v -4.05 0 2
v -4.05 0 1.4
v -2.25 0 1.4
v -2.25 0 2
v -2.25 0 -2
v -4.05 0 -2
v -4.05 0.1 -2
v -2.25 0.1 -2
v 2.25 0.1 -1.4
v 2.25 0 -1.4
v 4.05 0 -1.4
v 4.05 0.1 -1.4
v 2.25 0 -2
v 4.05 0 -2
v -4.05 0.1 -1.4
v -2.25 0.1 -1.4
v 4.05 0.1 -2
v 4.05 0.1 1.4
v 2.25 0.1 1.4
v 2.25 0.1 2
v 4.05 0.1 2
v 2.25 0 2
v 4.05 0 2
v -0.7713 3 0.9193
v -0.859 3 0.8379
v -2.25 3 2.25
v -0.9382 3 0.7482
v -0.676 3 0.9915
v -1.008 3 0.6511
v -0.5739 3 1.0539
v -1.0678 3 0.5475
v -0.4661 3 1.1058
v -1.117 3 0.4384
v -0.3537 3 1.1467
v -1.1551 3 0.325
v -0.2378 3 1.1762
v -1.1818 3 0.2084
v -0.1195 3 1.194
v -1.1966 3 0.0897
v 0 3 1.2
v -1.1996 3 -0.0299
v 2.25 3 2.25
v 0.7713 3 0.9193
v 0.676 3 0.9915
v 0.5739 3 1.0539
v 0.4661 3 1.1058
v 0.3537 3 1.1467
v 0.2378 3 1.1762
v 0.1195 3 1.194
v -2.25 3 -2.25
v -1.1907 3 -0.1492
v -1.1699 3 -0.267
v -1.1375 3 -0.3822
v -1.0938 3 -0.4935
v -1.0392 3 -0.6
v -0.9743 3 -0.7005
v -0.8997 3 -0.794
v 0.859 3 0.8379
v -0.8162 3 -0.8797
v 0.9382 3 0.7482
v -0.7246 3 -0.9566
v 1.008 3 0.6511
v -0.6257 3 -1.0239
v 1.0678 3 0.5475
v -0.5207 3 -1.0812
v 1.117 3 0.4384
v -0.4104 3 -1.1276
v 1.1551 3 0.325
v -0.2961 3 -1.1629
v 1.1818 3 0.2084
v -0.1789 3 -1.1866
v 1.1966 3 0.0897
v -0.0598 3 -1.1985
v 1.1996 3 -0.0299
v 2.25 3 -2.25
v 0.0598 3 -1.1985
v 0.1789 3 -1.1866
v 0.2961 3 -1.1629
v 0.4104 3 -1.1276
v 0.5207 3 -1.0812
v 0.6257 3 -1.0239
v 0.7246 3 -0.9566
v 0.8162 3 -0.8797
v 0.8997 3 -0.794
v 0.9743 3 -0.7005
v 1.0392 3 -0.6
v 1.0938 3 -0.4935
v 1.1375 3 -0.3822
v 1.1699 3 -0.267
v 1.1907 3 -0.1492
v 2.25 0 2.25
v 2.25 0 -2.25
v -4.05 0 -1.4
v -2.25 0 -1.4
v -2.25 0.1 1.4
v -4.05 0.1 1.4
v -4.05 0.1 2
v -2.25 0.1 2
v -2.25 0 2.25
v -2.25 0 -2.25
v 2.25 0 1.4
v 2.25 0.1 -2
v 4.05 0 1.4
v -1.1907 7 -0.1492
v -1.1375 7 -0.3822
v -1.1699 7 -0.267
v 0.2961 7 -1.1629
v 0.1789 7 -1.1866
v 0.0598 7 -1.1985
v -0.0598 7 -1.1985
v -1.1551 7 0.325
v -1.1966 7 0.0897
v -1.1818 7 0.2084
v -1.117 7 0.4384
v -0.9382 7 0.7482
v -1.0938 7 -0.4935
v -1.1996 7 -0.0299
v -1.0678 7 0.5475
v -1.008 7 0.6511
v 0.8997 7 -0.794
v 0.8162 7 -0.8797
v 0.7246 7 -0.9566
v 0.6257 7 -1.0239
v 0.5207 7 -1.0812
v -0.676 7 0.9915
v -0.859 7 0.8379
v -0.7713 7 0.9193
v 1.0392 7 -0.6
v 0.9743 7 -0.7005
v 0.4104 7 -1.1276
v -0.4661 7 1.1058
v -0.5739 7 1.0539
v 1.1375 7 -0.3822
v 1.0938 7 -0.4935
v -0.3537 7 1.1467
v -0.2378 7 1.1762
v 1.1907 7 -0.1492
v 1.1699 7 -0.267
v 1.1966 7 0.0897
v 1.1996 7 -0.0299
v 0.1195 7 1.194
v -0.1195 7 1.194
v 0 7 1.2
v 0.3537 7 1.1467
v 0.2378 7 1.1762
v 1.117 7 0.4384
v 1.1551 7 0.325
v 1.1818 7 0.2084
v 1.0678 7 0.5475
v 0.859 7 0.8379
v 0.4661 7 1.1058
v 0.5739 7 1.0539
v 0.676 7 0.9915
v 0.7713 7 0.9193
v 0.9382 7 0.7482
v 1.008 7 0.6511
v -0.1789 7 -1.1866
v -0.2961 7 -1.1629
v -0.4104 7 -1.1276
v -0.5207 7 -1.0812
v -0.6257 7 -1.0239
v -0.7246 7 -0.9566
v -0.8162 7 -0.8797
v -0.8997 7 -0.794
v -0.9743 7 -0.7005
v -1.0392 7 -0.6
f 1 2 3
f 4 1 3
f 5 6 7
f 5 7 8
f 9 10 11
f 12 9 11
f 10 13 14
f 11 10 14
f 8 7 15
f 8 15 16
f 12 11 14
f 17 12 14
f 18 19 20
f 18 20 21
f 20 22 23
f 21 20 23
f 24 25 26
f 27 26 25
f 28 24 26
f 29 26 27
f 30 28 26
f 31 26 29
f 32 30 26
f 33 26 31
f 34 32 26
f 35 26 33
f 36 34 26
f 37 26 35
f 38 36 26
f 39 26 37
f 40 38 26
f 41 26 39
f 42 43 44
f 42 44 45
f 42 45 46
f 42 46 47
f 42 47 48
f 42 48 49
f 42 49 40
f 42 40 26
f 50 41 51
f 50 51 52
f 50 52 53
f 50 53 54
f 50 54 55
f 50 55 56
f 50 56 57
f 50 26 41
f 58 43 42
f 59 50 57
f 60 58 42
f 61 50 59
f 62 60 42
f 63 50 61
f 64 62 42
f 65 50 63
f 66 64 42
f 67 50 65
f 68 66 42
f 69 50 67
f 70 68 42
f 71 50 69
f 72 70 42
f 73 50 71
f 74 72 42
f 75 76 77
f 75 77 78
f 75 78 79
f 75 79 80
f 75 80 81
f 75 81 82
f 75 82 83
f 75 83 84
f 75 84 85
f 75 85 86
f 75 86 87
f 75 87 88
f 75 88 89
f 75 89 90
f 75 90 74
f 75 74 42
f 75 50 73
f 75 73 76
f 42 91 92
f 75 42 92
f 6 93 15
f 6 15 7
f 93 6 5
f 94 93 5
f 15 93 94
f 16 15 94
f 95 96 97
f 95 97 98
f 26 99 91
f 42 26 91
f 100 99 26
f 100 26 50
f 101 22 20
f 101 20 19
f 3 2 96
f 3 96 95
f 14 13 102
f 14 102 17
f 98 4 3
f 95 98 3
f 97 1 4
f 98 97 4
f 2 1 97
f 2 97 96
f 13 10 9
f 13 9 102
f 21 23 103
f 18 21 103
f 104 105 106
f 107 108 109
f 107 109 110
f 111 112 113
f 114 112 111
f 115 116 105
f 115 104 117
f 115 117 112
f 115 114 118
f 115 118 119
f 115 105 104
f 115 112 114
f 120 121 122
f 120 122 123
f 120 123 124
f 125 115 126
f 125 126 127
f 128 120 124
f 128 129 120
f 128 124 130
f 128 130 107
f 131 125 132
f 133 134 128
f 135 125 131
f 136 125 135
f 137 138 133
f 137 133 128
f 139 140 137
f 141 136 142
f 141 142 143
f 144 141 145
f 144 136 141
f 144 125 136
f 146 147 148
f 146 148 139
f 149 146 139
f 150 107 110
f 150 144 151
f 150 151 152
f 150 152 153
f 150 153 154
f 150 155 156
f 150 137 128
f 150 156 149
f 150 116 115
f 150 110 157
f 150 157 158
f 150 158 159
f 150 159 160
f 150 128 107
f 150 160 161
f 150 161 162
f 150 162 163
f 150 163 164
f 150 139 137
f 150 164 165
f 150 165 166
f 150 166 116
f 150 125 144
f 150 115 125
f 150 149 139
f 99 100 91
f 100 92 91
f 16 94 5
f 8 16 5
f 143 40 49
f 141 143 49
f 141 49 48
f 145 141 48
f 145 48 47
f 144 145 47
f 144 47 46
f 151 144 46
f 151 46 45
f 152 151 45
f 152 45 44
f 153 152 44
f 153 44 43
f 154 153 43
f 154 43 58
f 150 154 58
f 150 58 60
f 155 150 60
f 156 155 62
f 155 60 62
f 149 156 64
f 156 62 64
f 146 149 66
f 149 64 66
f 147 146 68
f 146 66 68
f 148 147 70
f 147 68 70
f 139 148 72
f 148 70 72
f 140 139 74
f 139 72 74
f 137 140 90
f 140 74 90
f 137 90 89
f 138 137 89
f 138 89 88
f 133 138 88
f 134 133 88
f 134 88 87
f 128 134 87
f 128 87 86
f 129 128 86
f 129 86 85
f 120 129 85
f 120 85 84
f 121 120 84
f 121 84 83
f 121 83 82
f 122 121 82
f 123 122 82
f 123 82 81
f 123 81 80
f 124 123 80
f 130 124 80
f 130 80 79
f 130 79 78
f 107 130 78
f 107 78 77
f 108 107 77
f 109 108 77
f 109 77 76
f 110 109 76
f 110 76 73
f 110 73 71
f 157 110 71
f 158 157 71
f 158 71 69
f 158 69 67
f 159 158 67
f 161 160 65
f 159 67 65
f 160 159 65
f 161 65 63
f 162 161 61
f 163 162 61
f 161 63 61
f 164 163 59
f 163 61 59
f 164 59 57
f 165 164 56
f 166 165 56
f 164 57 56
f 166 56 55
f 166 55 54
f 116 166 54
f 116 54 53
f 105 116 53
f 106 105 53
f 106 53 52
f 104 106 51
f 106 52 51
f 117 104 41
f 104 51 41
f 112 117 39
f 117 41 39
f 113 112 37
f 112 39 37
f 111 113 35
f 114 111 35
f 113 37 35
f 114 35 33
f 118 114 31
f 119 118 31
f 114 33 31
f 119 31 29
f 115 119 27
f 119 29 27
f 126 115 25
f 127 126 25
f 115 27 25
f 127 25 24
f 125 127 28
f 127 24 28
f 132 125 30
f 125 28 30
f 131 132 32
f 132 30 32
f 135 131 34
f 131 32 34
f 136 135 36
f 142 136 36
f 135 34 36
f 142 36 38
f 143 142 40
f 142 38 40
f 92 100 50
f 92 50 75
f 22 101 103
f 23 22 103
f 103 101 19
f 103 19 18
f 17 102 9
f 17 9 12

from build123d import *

# Parameters (mm, degrees)
SKETCH_1_W        = 4.5
SKETCH_1_H        = 4.5
EXTRUDE_1_DEPTH   = 3
SKETCH_2_R        = 1.2
EXTRUDE_2_DEPTH   = 7
SKETCH_3_W        = 1.8
SKETCH_3_H        = 0.6
EXTRUDE_3_DEPTH   = 0.1
EXTRUDE_3_2_DEPTH = 0.1
EXTRUDE_3_3_DEPTH = 0.1
EXTRUDE_3_4_DEPTH = 0.1


with BuildPart() as part:
    # Эскиз1 → Бобышка-Вытянуть1 (new body)
    with BuildSketch(Plane(origin=(0, 0, 0), x_dir=(1, 0, 0), z_dir=(0, 1, 0))):
        Rectangle(SKETCH_1_W, SKETCH_1_H)
    extrude(amount=EXTRUDE_1_DEPTH)

    # Эскиз2 → Бобышка-Вытянуть2 (add)
    with BuildSketch(Plane(origin=(0, 0, 0), x_dir=(1, 0, 0), z_dir=(0, 1, 0))):
        with Locations(Location((0, 0, 0), (0, 0, 270))):
            Circle(SKETCH_2_R)
    extrude(amount=EXTRUDE_2_DEPTH)


with BuildPart() as body_2:
    # Эскиз3 → Бобышка-Вытянуть3 (new body)
    with BuildSketch(Plane(origin=(0, 0, 0), x_dir=(1, 0, 0), z_dir=(0, 1, 0))):
        with Locations((-3.15, -1.7)):
            Rectangle(SKETCH_3_W, SKETCH_3_H)
    extrude(amount=EXTRUDE_3_DEPTH)


with BuildPart() as body_3:
    # Эскиз3 → Extrude 3 2 (new body)
    with BuildSketch(Plane(origin=(0, 0, 0), x_dir=(1, 0, 0), z_dir=(0, 1, 0))):
        with Locations((-3.15, 1.7)):
            Rectangle(SKETCH_3_W, SKETCH_3_H)
    extrude(amount=EXTRUDE_3_2_DEPTH)


with BuildPart() as body_4:
    # Эскиз3 → Extrude 3 3 (new body)
    with BuildSketch(Plane(origin=(0, 0, 0), x_dir=(1, 0, 0), z_dir=(0, 1, 0))):
        with Locations((3.15, 1.7)):
            Rectangle(SKETCH_3_W, SKETCH_3_H)
    extrude(amount=EXTRUDE_3_3_DEPTH)


with BuildPart() as body_5:
    # Эскиз3 → Extrude 3 4 (new body)
    with BuildSketch(Plane(origin=(0, 0, 0), x_dir=(1, 0, 0), z_dir=(0, 1, 0))):
        with Locations((3.15, -1.7)):
            Rectangle(SKETCH_3_W, SKETCH_3_H)
    extrude(amount=EXTRUDE_3_4_DEPTH)


solid = Compound([part.part, body_2.part, body_3.part, body_4.part, body_5.part])
